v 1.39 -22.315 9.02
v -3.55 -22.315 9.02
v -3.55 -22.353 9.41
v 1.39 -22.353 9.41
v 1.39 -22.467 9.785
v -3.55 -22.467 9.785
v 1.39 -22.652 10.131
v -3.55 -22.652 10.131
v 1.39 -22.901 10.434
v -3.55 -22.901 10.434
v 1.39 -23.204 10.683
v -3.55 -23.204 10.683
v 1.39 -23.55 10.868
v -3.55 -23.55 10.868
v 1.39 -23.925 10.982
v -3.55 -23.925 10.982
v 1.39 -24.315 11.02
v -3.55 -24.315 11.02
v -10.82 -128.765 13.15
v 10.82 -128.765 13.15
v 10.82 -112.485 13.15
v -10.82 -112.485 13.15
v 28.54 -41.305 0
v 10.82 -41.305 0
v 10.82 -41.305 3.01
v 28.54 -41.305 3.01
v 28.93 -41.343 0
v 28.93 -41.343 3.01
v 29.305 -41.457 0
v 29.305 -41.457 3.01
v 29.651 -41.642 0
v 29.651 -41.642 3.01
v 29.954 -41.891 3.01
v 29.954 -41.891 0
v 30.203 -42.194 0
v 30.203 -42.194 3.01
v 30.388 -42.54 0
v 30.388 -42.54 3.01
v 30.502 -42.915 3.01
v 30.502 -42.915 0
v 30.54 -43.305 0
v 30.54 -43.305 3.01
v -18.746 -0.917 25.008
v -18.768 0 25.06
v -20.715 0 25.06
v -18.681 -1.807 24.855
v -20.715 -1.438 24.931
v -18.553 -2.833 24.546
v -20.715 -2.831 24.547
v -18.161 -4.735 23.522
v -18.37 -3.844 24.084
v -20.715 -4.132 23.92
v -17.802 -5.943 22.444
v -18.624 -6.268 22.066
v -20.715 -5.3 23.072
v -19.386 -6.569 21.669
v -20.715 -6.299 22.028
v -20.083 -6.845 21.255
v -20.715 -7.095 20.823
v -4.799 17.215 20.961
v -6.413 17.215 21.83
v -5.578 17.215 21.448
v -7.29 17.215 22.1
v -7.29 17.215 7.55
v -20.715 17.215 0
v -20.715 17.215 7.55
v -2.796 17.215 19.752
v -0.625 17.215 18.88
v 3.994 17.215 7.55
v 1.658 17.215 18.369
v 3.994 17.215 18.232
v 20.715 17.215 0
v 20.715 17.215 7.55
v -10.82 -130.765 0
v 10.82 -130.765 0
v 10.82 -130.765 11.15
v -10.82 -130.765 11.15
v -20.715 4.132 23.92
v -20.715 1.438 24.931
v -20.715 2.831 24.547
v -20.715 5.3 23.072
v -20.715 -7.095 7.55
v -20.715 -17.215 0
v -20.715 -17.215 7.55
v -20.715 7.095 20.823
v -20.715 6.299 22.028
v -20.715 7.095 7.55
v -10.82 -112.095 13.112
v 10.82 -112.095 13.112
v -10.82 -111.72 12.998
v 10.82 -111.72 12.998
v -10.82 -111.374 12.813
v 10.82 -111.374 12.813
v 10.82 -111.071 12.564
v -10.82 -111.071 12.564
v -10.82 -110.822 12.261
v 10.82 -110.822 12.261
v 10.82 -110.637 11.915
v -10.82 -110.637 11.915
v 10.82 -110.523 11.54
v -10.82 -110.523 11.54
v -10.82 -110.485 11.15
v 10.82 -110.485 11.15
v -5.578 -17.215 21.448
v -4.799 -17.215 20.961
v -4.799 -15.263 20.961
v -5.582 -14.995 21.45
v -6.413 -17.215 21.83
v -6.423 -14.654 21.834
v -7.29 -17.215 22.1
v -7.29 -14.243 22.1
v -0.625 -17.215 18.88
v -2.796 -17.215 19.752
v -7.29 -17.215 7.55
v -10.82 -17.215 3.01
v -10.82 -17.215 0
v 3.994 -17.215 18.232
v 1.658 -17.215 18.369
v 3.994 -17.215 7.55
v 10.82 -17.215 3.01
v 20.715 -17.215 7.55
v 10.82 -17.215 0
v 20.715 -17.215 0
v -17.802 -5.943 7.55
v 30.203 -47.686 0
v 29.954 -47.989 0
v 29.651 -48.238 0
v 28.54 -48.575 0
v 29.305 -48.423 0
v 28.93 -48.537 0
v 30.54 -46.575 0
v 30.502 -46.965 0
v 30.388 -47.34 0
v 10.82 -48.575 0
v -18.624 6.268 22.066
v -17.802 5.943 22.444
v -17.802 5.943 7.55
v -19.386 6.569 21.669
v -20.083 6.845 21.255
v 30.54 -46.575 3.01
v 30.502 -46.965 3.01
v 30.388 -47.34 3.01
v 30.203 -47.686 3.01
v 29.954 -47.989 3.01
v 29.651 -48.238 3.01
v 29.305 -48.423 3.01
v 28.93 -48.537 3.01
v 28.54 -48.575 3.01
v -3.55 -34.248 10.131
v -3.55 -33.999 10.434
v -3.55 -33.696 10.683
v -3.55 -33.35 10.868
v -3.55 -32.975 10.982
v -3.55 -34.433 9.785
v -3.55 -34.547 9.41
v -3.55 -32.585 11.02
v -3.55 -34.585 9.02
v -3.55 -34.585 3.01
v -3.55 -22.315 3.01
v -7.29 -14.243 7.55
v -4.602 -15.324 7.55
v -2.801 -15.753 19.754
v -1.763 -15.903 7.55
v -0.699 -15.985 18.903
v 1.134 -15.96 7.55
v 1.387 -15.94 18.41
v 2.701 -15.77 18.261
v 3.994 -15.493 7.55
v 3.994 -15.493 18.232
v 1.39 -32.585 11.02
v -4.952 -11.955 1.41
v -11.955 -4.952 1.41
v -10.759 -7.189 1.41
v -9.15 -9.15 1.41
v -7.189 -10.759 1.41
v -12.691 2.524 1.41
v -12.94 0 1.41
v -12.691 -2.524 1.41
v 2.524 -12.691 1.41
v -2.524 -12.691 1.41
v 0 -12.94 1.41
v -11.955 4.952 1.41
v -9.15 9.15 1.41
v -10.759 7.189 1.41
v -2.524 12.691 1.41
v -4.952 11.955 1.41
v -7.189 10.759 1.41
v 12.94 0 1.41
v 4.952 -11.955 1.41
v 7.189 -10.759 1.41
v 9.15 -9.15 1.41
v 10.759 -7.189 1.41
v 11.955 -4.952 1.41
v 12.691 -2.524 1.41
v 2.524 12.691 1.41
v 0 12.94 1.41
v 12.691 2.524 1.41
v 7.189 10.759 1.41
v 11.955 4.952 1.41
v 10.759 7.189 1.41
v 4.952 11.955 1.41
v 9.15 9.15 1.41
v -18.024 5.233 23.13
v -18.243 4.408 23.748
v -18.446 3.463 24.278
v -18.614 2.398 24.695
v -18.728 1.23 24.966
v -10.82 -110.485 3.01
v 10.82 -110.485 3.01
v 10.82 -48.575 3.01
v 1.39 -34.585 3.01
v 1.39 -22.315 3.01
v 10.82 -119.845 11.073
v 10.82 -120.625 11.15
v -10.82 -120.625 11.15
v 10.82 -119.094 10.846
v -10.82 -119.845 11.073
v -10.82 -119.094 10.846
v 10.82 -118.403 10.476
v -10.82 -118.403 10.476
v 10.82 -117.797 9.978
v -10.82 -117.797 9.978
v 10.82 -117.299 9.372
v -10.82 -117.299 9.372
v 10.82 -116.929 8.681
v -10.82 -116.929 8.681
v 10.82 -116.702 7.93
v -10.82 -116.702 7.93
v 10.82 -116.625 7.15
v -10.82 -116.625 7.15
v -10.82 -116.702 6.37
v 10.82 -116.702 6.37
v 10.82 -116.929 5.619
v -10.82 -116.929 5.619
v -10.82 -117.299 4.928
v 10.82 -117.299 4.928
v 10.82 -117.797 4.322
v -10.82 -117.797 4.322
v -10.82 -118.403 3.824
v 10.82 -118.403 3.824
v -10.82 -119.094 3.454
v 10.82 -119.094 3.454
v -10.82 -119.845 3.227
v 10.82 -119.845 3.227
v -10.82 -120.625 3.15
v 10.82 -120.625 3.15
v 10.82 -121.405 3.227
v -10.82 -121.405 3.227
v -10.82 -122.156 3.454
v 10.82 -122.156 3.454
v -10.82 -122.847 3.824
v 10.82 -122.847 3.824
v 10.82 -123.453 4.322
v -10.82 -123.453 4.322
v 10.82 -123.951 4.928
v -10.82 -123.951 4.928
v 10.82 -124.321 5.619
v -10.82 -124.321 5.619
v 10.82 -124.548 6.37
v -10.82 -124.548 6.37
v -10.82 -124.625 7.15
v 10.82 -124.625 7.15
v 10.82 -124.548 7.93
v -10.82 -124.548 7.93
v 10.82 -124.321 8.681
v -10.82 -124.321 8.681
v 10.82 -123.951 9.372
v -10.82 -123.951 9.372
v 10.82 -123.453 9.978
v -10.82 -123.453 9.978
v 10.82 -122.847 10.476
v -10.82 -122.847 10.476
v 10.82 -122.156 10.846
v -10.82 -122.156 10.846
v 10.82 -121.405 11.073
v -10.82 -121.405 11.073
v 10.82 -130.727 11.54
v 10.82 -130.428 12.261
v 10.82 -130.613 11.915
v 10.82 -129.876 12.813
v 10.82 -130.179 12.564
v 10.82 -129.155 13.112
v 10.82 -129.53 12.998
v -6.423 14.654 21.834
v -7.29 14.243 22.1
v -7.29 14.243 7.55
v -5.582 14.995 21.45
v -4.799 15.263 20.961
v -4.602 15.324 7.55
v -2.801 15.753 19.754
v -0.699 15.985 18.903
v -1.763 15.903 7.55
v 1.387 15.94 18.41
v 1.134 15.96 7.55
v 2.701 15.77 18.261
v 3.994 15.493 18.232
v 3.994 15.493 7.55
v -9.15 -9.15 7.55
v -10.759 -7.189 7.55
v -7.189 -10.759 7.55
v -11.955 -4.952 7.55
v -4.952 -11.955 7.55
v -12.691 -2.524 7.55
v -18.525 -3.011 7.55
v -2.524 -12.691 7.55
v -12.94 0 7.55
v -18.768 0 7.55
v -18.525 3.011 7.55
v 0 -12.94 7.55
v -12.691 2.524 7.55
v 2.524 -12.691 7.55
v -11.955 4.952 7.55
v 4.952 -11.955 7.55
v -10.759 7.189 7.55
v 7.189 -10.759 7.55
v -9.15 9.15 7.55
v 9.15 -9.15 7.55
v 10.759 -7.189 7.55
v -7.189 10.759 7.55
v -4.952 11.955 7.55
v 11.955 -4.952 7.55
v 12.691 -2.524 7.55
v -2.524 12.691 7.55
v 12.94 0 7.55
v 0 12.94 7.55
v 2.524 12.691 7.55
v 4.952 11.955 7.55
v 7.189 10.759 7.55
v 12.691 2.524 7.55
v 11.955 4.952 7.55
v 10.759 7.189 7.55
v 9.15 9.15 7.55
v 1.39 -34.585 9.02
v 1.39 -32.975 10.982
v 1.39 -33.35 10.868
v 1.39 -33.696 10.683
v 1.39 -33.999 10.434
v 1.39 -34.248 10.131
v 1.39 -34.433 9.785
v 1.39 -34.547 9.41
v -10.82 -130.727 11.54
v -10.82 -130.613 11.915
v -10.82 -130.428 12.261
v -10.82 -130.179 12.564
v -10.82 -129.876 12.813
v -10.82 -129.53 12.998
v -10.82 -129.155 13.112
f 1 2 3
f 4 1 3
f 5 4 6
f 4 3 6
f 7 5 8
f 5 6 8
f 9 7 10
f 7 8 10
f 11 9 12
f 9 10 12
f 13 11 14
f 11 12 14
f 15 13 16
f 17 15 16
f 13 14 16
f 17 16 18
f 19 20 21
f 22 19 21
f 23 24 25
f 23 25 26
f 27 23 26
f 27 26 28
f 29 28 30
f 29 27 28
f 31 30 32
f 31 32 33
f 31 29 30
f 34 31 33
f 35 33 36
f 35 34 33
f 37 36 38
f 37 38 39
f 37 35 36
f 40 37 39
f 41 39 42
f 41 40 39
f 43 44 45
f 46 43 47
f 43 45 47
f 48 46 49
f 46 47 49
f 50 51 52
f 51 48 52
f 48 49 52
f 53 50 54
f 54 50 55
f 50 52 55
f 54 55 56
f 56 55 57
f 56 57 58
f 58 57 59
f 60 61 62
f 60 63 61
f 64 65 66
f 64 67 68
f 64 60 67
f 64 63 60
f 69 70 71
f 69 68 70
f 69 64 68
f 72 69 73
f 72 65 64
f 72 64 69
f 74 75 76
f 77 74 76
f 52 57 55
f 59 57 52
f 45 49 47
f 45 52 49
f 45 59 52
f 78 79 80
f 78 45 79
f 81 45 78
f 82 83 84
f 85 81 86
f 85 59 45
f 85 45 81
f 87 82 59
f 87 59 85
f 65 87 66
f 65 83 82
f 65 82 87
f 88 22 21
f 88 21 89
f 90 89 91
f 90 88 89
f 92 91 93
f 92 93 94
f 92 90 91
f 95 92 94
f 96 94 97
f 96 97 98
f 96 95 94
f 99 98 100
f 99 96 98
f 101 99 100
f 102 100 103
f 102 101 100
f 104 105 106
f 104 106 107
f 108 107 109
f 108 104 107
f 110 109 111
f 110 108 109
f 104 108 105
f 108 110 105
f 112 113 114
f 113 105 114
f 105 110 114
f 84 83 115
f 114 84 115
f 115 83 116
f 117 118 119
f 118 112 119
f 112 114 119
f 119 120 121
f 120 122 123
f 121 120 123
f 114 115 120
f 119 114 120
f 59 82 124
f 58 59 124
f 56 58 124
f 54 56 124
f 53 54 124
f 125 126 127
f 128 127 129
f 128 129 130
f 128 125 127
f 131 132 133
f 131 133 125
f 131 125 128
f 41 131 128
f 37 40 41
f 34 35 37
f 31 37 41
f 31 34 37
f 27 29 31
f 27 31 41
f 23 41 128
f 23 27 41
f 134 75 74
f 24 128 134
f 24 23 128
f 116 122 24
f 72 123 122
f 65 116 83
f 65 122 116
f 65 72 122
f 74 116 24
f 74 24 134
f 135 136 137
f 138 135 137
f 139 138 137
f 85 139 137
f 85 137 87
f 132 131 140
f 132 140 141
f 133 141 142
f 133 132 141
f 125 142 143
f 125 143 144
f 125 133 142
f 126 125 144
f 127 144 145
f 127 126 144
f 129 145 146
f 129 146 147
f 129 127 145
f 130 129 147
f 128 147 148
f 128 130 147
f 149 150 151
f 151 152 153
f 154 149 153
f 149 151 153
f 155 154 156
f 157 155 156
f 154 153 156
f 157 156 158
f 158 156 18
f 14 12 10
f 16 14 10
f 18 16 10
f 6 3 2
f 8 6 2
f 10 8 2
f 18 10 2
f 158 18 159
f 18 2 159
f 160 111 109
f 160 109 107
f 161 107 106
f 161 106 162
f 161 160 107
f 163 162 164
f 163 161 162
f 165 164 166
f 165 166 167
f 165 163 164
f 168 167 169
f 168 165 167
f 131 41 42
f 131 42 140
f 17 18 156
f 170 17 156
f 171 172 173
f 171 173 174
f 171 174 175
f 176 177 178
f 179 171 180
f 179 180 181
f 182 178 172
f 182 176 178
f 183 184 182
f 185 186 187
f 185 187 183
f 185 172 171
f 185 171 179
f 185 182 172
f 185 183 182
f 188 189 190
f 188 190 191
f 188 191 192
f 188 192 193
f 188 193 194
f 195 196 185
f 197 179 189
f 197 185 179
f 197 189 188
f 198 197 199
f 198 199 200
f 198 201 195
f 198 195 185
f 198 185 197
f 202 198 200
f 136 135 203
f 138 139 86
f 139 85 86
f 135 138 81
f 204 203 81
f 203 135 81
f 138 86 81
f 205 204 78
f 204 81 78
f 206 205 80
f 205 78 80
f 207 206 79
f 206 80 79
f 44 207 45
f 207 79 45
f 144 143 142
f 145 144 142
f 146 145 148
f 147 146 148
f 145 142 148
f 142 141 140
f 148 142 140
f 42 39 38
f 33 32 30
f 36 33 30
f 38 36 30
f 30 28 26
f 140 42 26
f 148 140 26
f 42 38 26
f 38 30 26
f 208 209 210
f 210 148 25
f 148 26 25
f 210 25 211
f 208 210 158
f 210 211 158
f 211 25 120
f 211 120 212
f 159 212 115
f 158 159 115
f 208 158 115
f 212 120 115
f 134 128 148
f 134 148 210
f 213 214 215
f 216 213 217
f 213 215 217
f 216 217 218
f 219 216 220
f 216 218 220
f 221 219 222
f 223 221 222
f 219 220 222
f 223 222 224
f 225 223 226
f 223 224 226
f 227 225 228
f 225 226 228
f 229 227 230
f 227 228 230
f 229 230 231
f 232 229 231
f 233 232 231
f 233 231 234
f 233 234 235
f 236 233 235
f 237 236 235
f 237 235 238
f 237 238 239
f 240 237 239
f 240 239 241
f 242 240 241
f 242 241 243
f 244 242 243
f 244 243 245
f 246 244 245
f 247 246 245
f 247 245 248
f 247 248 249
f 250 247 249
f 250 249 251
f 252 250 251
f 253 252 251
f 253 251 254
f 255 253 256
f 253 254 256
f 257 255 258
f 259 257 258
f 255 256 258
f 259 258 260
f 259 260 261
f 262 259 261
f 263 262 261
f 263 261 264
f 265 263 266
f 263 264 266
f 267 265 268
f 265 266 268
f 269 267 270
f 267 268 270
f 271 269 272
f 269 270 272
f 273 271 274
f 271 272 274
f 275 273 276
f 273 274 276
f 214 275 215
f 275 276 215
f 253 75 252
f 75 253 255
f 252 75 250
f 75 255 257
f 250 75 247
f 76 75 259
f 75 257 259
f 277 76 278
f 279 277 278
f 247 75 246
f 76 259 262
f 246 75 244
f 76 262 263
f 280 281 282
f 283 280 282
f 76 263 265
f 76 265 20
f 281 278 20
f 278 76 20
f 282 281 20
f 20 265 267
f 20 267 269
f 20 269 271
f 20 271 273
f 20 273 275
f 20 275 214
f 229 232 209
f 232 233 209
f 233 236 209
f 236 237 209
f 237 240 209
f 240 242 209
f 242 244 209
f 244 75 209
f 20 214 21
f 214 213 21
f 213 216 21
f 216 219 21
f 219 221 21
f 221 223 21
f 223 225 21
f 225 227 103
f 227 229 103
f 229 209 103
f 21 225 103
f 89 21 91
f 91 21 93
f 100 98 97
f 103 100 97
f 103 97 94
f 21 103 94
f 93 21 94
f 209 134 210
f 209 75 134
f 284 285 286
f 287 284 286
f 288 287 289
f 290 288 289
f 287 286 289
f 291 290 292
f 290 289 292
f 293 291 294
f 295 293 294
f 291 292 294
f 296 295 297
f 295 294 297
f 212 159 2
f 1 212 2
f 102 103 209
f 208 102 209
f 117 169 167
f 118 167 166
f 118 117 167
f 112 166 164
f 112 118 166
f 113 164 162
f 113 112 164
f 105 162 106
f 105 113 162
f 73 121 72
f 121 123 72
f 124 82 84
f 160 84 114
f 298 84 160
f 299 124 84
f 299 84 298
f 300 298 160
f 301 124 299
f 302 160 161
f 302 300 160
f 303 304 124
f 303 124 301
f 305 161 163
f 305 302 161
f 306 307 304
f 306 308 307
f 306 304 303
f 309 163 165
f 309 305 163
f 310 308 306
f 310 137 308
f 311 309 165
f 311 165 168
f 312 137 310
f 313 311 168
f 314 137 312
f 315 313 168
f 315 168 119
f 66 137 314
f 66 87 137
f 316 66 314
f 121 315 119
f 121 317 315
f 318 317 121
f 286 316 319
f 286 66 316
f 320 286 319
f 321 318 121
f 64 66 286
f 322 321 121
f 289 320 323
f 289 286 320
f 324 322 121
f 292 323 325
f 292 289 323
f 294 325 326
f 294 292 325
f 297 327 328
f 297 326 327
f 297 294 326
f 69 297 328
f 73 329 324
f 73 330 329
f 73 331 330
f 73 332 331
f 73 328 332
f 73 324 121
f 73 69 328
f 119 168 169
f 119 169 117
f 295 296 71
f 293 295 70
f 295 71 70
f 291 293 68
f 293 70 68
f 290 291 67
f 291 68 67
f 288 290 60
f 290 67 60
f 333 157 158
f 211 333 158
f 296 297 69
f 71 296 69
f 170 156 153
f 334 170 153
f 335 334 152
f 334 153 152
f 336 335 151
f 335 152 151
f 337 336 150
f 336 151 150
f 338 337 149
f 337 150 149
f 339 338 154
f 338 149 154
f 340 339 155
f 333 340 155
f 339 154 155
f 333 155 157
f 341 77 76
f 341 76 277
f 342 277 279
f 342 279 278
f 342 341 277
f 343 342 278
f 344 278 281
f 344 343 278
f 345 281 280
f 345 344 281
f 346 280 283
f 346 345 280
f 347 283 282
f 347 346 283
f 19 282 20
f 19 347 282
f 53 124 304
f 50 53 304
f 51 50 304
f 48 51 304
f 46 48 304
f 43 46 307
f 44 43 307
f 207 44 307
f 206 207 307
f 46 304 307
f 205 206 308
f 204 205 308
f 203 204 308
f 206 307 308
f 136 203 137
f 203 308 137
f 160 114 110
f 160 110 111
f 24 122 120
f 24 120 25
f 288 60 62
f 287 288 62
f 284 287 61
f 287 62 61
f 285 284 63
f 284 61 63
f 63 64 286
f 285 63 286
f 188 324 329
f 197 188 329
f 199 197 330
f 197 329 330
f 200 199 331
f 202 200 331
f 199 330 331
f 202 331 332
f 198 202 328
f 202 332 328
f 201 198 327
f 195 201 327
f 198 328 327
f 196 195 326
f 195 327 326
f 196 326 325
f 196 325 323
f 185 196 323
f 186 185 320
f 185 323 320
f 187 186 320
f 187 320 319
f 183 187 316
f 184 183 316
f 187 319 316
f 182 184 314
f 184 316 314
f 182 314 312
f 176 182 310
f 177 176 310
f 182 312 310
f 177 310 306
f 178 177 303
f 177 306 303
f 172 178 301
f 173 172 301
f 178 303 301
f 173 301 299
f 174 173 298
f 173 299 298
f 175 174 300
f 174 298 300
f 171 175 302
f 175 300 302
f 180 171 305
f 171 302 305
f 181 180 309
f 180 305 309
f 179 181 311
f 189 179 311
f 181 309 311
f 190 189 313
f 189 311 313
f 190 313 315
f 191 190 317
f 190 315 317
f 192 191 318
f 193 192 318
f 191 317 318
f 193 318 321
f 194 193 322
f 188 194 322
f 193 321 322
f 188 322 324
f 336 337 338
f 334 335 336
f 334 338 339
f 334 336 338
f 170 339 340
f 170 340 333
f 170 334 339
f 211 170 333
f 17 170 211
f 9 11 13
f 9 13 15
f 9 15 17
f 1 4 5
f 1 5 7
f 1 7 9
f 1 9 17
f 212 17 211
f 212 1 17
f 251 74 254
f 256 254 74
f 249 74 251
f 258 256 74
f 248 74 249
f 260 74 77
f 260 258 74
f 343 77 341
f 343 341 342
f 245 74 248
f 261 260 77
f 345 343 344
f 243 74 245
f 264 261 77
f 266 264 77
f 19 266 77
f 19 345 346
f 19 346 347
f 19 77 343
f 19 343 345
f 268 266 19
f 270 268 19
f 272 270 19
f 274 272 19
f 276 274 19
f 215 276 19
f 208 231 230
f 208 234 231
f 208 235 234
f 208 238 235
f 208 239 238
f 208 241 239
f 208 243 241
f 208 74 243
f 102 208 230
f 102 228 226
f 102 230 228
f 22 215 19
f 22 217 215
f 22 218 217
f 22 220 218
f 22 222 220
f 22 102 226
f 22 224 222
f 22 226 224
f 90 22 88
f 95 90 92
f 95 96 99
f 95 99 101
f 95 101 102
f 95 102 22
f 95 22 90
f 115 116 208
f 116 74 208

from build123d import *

# Parameters (mm, degrees)
EXTRUDE_4_DEPTH          = 3.01
SKETCH_3_W               = 41.43
SKETCH_3_H               = 34.43
EXTRUDE_5_DEPTH          = 4.54
SKETCH_4_R               = 12.94
CUT_EXTRUDE_1_DEPTH      = 6.14
EXTRUDE_7_DEPTH          = 4.94
EXTRUDE_9_DEPTH          = 21.64
SKETCH_8_R               = 4
CUT_EXTRUDE_2_DEPTH      = 138.779016272
EXTRUDE_10_DEPTH         = 14.55
CUT_EXTRUDE_7_REACH      = 154.706
CUT_EXTRUDE_7_END_RADIUS = 16
EXTRUDE_11_DEPTH         = 17.51
CUT_EXTRUDE_8_REACH      = 144.669
CUT_EXTRUDE_8_END_RADIUS = 18.768238988


with BuildPart() as part:
    # 草图1 → 凸台-拉伸4 (new body)
    with BuildSketch(Plane.XY):
        with BuildLine():
            Line((10.82, -17.215), (10.82, -41.305))
            Line((10.82, -41.305), (28.54, -41.305))
            ThreePointArc((28.54, -41.305), (29.954213562, -41.890786438), (30.54, -43.305))
            Line((30.54, -43.305), (30.54, -46.575))
            ThreePointArc((30.54, -46.575), (29.954213562, -47.989213562), (28.54, -48.575))
            Line((28.54, -48.575), (10.82, -48.575))
            Line((10.82, -48.575), (10.82, -130.765))
            Line((10.82, -130.765), (-10.82, -130.765))
            Line((-10.82, -130.765), (-10.82, -17.215))
            Line((-10.82, -17.215), (-20.715, -17.215))
            Line((-20.715, -17.215), (-20.715, 17.215))
            Line((-20.715, 17.215), (20.715, 17.215))
            Line((20.715, 17.215), (20.715, -17.215))
            Line((20.715, -17.215), (10.82, -17.215))
        make_face()
    extrude(amount=EXTRUDE_4_DEPTH)

    # 草图3 → 凸台-拉伸5 (add)
    with BuildSketch(Plane.XY.offset(3.01)):
        Rectangle(SKETCH_3_W, SKETCH_3_H)
    extrude(amount=EXTRUDE_5_DEPTH)

    # 草图4 → 切除-拉伸1 (cut)
    with BuildSketch(Plane.XY.offset(7.55)):
        Circle(SKETCH_4_R)
    extrude(amount=-CUT_EXTRUDE_1_DEPTH, mode=Mode.SUBTRACT)

    # 草图6 → 凸台-拉伸7 (add)
    with BuildSketch(Plane.ZY.offset(3.55)):
        with BuildLine():
            Line((3.01, -22.315), (9.02, -22.315))
            ThreePointArc((9.02, -22.315), (10.434213562, -22.900786438), (11.02, -24.315))
            Line((11.02, -24.315), (11.02, -32.585))
            ThreePointArc((11.02, -32.585), (10.434213562, -33.999213562), (9.02, -34.585))
            Line((9.02, -34.585), (3.01, -34.585))
            Line((3.01, -34.585), (3.01, -22.315))
        make_face()
    extrude(amount=-EXTRUDE_7_DEPTH)

    # 草图7 → 凸台-拉伸9 (add)
    with BuildSketch(Plane.ZY.offset(10.82)):
        with BuildLine():
            Line((3.01, -130.765), (11.15, -130.765))
            ThreePointArc((11.15, -130.765), (12.564213562, -130.179213562), (13.15, -128.765))
            Line((13.15, -128.765), (13.15, -112.485))
            ThreePointArc((13.15, -112.485), (12.564213562, -111.070786438), (11.15, -110.485))
            Line((11.15, -110.485), (3.01, -110.485))
            Line((3.01, -110.485), (3.01, -130.765))
        make_face()
    extrude(amount=-EXTRUDE_9_DEPTH)

    # 草图8 → 切除-拉伸2 (cut, through all)
    with BuildSketch(Plane.ZY.offset(10.82)):
        with Locations((7.15, -120.625)):
            Circle(SKETCH_8_R)
    extrude(amount=-CUT_EXTRUDE_2_DEPTH, mode=Mode.SUBTRACT)

    # 草图9 → 凸台-拉伸10 (add)
    with BuildSketch(Plane.XY.offset(7.55)):
        with BuildLine():
            Line((3.994247308, 17.215), (-7.290402008, 17.215))
            Line((-7.290402008, 17.215), (-7.290402008, 14.242543262))
            ThreePointArc((-7.290402008, 14.242543262), (-1.762762206, 15.902599454), (3.994247308, 15.493417584))
            Line((3.994247308, 15.493417584), (3.994247308, 17.215))
        make_face()
    extrude_10 = extrude(amount=EXTRUDE_10_DEPTH)

    # 切除-拉伸7: up to this cylinder (the profile starts outside it)
    cut_extrude_7_end = Plane(origin=(0, 0, 20.532167), z_dir=(0, 0, -1)) * Cylinder(CUT_EXTRUDE_7_END_RADIUS, 342.412, mode=Mode.PRIVATE)
    # 草图10 → 切除-拉伸7 (cut, up to the surface)
    with BuildSketch(Plane(origin=(0, 17.215, 0), x_dir=(1, 0, 0), z_dir=(0, 1, 0)), mode=Mode.PRIVATE) as cut_extrude_7_sk1:
        with BuildLine():
            Line((3.994247308, -21.947856721), (3.994247308, -18.232150221))
            ThreePointArc((3.994247308, -18.232150221), (-0.624975177, -18.880311606), (-4.799480887, -20.961376627))
            ThreePointArc((-4.799480887, -20.961376627), (-5.989188818, -21.652656126), (-7.290402008, -22.1))
            Line((-7.290402008, -22.1), (3.994247308, -22.1))
            Line((3.994247308, -22.1), (3.994247308, -21.947856721))
        make_face()
    cut_extrude_7_tool1 = extrude(cut_extrude_7_sk1.sketch, amount=-CUT_EXTRUDE_7_REACH, mode=Mode.PRIVATE) - cut_extrude_7_end
    cut_extrude_7 = cut_extrude_7_tool1.solids().sort_by_distance((-0.002076, 17.215, 20.532167))[0]
    add(cut_extrude_7, mode=Mode.SUBTRACT)

    # 镜向1: 凸台-拉伸10, 切除-拉伸7 across plane
    add(extrude_10.mirror(Plane(origin=(0, 0, 0), x_dir=(0, 0, 1), z_dir=(0, -1, 0))))
    add(cut_extrude_7.mirror(Plane(origin=(0, 0, 0), x_dir=(0, 0, 1), z_dir=(0, -1, 0))), mode=Mode.SUBTRACT)

    # 草图12 → 凸台-拉伸11 (add)
    with BuildSketch(Plane.XY.offset(7.55)):
        with BuildLine():
            Line((-17.802400725, 5.943174502), (-20.715, 7.09508926))
            Line((-20.715, 7.09508926), (-20.715, -7.09508926))
            Line((-20.715, -7.09508926), (-17.802400725, -5.943174502))
            ThreePointArc((-17.802400725, -5.943174502), (-18.768238988, 0), (-17.802400725, 5.943174502))
        make_face()
    extrude(amount=EXTRUDE_11_DEPTH)

    # 切除-拉伸8: up to this cylinder (the profile starts outside it)
    cut_extrude_8_end = Plane(origin=(0, 0, 23.877666), z_dir=(0, 0, -1)) * Cylinder(CUT_EXTRUDE_8_END_RADIUS, 327.874477976, mode=Mode.PRIVATE)
    # 草图13 → 切除-拉伸8 (cut, up to the surface)
    with BuildSketch(Plane.ZY.offset(20.715), mode=Mode.PRIVATE) as cut_extrude_8_sk1:
        with BuildLine():
            ThreePointArc((25.06, 0), (23.920244617, -4.131873769), (20.823346631, -7.09508926))
            Line((20.823346631, -7.09508926), (25.06, -7.09508926))
            Line((25.06, -7.09508926), (25.06, 0))
        make_face()
    cut_extrude_8_tool1 = extrude(cut_extrude_8_sk1.sketch, amount=-CUT_EXTRUDE_8_REACH, mode=Mode.PRIVATE) - cut_extrude_8_end
    add(cut_extrude_8_tool1.solids().sort_by_distance((-20.715, -5.42758, 23.877666))[0], mode=Mode.SUBTRACT)
    # 草图13 → 切除-拉伸8 (cut, up to the surface)
    with BuildSketch(Plane.ZY.offset(20.715), mode=Mode.PRIVATE) as cut_extrude_8_sk2:
        with BuildLine():
            ThreePointArc((20.823346631, 7.09508926), (23.920244617, 4.131873769), (25.06, 0))
            Line((25.06, 0), (25.06, 7.09508926))
            Line((25.06, 7.09508926), (20.823346631, 7.09508926))
        make_face()
    cut_extrude_8_tool2 = extrude(cut_extrude_8_sk2.sketch, amount=-CUT_EXTRUDE_8_REACH, mode=Mode.PRIVATE) - cut_extrude_8_end
    add(cut_extrude_8_tool2.solids().sort_by_distance((-20.715, 5.42758, 23.877666))[0], mode=Mode.SUBTRACT)


solid = part.part
